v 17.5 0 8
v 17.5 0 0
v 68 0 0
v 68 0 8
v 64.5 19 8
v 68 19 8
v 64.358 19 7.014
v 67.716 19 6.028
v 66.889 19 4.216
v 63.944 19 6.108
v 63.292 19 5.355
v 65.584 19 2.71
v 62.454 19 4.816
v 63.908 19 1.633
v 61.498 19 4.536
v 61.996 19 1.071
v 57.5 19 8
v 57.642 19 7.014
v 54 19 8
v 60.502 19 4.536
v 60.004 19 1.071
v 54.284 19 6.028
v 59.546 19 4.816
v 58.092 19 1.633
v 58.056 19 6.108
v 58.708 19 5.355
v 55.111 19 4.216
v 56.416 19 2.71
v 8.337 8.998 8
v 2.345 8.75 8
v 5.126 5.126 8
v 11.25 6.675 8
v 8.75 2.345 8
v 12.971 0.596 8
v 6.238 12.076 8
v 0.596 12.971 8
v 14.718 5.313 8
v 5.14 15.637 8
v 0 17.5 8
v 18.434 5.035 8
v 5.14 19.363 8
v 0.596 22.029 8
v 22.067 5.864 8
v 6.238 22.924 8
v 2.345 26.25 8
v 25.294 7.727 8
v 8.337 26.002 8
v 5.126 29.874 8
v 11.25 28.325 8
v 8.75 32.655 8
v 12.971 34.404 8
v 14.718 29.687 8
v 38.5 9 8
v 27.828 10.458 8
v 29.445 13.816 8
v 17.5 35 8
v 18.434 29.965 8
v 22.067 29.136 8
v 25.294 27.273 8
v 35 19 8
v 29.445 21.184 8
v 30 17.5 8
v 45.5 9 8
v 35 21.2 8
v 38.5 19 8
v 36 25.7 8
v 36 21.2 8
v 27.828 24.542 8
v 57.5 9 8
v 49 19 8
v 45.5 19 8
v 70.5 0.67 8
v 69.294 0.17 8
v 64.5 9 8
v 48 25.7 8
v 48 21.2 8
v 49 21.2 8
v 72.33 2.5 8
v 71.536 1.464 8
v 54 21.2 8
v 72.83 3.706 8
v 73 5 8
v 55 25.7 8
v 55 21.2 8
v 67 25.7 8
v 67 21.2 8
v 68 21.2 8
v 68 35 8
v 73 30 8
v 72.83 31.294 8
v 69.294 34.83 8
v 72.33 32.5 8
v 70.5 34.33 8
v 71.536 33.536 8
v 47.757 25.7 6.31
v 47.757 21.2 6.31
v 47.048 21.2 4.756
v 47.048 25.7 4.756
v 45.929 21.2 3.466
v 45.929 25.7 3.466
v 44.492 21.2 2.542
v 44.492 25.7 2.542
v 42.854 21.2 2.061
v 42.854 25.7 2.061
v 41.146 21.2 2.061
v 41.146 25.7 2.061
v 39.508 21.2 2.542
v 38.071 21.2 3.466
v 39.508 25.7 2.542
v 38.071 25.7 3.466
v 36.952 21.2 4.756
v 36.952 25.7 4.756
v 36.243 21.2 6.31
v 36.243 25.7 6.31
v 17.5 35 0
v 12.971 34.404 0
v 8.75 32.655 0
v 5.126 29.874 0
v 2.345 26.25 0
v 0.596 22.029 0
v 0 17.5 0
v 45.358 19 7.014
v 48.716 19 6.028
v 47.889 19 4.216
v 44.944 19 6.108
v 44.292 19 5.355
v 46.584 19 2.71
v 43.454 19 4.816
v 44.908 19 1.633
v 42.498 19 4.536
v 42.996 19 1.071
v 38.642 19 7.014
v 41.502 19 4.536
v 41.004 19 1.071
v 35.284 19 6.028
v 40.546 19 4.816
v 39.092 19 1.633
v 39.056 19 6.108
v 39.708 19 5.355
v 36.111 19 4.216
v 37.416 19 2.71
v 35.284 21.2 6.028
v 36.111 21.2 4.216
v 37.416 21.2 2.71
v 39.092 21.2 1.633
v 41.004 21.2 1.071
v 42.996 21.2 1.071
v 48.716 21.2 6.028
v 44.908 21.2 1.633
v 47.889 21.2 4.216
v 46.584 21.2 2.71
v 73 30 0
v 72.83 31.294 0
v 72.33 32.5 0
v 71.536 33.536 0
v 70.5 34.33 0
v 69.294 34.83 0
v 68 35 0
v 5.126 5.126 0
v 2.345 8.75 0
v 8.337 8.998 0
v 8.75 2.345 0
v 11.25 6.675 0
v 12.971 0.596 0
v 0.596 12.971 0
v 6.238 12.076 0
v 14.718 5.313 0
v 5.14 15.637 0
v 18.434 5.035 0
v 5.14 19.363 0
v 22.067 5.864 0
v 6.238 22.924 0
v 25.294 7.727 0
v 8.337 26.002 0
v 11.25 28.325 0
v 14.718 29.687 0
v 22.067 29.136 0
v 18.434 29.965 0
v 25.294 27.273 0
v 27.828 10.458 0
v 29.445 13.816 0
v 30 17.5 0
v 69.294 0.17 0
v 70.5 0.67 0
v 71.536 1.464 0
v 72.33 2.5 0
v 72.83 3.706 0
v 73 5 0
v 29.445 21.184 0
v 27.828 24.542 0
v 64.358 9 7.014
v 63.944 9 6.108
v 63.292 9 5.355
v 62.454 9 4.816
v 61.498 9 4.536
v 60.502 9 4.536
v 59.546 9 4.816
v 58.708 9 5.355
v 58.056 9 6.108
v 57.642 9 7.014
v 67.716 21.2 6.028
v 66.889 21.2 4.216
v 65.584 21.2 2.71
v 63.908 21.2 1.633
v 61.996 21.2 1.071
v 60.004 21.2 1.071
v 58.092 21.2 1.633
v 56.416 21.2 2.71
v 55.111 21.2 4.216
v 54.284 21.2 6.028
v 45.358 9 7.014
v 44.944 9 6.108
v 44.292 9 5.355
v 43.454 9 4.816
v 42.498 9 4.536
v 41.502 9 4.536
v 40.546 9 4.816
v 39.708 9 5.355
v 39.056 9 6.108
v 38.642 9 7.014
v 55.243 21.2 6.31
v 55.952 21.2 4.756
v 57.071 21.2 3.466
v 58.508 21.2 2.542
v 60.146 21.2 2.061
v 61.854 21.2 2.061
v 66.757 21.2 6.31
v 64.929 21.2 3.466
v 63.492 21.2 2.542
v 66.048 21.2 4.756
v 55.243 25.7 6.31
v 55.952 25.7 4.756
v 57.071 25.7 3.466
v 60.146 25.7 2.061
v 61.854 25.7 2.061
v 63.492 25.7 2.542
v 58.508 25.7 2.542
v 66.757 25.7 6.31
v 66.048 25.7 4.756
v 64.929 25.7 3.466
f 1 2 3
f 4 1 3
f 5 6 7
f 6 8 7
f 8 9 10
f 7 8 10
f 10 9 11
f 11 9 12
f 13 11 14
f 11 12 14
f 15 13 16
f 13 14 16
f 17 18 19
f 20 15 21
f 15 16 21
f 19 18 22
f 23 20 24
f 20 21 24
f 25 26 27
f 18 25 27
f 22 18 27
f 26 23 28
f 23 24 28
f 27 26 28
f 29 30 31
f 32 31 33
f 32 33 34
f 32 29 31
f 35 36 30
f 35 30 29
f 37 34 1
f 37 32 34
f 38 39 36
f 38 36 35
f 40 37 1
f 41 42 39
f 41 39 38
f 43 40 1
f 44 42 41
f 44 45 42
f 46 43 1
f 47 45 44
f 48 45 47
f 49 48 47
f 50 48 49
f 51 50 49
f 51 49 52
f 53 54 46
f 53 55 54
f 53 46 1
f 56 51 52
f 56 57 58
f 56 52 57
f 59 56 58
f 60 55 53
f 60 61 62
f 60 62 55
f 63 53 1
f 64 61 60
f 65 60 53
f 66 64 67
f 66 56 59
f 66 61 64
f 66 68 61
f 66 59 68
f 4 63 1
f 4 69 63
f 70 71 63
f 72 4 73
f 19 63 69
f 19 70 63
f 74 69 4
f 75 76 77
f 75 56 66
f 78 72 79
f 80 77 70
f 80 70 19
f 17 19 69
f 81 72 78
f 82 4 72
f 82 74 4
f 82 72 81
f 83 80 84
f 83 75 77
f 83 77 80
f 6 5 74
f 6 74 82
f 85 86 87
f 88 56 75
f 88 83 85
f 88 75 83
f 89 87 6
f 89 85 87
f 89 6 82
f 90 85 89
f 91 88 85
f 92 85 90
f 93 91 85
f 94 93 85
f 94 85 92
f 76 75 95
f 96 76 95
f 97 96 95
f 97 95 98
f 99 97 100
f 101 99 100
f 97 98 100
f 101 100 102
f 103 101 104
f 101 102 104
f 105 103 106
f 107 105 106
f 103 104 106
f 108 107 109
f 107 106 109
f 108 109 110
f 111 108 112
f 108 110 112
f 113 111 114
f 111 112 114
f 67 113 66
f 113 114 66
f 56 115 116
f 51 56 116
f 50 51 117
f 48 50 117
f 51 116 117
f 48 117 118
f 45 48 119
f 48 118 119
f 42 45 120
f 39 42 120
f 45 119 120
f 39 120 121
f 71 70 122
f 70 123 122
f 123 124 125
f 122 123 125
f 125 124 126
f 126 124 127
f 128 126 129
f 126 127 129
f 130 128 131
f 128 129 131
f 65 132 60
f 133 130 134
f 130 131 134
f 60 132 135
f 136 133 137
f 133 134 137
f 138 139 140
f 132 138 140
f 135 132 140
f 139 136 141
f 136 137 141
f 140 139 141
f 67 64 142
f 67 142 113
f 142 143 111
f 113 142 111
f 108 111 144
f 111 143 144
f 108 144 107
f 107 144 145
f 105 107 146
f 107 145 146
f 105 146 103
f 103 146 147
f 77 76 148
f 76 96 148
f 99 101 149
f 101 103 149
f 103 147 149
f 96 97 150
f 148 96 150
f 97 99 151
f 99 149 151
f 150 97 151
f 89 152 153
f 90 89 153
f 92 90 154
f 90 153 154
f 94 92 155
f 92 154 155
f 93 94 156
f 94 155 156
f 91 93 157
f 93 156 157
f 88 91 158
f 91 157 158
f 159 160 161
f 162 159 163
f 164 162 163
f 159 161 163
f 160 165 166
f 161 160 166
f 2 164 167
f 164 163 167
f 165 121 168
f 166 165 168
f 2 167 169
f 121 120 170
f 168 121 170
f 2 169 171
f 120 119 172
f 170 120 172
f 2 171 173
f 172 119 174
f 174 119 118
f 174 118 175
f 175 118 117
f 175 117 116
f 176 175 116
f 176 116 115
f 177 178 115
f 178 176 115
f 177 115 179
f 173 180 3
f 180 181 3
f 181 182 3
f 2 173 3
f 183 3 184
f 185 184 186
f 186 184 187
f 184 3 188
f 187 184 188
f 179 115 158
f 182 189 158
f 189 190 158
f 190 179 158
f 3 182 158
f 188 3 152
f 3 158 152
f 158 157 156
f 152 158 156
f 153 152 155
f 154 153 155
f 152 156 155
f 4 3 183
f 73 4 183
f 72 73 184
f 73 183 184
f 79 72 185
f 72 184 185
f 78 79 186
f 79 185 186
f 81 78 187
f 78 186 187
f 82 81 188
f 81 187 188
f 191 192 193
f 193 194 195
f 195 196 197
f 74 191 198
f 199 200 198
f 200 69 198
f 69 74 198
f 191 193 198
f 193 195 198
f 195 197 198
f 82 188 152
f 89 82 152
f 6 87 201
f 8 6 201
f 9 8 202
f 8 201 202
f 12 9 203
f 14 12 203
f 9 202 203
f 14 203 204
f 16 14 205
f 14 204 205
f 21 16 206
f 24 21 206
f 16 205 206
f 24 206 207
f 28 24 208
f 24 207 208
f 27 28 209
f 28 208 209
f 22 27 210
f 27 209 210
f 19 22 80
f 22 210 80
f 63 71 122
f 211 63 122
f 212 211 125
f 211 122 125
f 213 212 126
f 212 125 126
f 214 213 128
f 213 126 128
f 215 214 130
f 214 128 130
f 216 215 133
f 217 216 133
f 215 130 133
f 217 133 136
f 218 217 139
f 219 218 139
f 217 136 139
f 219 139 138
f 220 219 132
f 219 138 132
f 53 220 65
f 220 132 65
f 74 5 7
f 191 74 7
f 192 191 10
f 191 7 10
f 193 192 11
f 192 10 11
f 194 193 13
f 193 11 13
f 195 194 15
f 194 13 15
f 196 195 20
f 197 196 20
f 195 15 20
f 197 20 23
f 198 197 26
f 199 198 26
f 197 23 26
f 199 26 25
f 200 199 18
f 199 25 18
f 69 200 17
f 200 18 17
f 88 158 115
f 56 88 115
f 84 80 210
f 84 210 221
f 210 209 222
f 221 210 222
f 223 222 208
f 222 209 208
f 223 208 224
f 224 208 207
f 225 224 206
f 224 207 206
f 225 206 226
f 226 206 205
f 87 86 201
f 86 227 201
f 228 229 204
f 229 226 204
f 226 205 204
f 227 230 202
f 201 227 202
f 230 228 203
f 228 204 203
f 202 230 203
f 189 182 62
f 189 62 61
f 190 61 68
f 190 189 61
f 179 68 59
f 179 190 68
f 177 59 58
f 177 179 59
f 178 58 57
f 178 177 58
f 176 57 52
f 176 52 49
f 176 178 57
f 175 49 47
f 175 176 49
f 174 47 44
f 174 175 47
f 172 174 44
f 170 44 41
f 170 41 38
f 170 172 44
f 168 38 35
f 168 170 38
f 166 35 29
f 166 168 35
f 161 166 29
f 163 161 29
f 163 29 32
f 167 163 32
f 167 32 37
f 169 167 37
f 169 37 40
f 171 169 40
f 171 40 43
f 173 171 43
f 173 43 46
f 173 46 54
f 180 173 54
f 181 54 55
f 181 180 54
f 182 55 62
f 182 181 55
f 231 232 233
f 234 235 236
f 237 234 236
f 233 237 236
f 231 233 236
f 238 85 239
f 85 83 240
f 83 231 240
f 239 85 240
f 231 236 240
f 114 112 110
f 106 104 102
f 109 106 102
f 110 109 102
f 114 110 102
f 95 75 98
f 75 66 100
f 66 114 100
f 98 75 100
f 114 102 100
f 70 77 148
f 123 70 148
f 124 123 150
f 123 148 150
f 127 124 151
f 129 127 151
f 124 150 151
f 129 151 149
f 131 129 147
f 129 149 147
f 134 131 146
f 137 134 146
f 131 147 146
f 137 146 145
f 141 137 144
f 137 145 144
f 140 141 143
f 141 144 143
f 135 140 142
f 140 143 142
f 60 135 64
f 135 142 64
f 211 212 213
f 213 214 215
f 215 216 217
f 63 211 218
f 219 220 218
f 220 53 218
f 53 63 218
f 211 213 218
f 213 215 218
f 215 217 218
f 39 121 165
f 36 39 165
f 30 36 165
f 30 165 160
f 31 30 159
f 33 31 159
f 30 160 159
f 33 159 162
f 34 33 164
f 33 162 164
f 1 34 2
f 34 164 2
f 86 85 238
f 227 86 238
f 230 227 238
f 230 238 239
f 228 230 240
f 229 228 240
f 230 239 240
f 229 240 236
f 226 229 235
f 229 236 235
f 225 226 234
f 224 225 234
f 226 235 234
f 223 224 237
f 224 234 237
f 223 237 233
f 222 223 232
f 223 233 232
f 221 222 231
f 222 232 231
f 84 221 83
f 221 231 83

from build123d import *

# Parameters (mm, degrees)
F0_R     = 12.5
F1_DEPTH = 8


with BuildPart() as f1:
    # F0 (on Top) → F1 (new body)
    with BuildSketch(Plane.XY):
        with BuildLine():
            ThreePointArc((0, 17.5), (5.125631, 5.125631), (17.5, 0))
            Line((17.5, 0), (68, 0))
            ThreePointArc((68, 0), (71.535534, 1.464466), (73, 5))
            Line((73, 5), (73, 30))
            ThreePointArc((73, 30), (71.535534, 33.535534), (68, 35))
            Line((68, 35), (17.5, 35))
            ThreePointArc((17.5, 35), (5.125631, 29.874369), (0, 17.5))
        make_face()
        with Locations((17.5, 17.5)):
            Circle(F0_R, mode=Mode.SUBTRACT)
    extrude(amount=F1_DEPTH)

    # F2 (on face) → F3 (revolve, cut)
    with BuildSketch(Plane.XY.offset(8)):
        Polygon((42, 19), (42, 9), (45.5, 9), (45.5, 19), (49, 19), (49, 21.2), (48, 21.2), (48, 25.7), (42, 25.7), (42, 21.2), align=None)
    revolve(axis=Axis((42, 14, 8), (0, 1, 0)), mode=Mode.SUBTRACT)

    # F2 (on face) → F4 (revolve, cut)
    with BuildSketch(Plane.XY.offset(8)):
        Polygon((61, 19), (61, 9), (64.5, 9), (64.5, 19), (68, 19), (68, 21.2), (67, 21.2), (67, 25.7), (61, 25.7), (61, 21.2), align=None)
    revolve(axis=Axis((61, 14, 8), (0, 1, 0)), mode=Mode.SUBTRACT)


solid = f1.part
